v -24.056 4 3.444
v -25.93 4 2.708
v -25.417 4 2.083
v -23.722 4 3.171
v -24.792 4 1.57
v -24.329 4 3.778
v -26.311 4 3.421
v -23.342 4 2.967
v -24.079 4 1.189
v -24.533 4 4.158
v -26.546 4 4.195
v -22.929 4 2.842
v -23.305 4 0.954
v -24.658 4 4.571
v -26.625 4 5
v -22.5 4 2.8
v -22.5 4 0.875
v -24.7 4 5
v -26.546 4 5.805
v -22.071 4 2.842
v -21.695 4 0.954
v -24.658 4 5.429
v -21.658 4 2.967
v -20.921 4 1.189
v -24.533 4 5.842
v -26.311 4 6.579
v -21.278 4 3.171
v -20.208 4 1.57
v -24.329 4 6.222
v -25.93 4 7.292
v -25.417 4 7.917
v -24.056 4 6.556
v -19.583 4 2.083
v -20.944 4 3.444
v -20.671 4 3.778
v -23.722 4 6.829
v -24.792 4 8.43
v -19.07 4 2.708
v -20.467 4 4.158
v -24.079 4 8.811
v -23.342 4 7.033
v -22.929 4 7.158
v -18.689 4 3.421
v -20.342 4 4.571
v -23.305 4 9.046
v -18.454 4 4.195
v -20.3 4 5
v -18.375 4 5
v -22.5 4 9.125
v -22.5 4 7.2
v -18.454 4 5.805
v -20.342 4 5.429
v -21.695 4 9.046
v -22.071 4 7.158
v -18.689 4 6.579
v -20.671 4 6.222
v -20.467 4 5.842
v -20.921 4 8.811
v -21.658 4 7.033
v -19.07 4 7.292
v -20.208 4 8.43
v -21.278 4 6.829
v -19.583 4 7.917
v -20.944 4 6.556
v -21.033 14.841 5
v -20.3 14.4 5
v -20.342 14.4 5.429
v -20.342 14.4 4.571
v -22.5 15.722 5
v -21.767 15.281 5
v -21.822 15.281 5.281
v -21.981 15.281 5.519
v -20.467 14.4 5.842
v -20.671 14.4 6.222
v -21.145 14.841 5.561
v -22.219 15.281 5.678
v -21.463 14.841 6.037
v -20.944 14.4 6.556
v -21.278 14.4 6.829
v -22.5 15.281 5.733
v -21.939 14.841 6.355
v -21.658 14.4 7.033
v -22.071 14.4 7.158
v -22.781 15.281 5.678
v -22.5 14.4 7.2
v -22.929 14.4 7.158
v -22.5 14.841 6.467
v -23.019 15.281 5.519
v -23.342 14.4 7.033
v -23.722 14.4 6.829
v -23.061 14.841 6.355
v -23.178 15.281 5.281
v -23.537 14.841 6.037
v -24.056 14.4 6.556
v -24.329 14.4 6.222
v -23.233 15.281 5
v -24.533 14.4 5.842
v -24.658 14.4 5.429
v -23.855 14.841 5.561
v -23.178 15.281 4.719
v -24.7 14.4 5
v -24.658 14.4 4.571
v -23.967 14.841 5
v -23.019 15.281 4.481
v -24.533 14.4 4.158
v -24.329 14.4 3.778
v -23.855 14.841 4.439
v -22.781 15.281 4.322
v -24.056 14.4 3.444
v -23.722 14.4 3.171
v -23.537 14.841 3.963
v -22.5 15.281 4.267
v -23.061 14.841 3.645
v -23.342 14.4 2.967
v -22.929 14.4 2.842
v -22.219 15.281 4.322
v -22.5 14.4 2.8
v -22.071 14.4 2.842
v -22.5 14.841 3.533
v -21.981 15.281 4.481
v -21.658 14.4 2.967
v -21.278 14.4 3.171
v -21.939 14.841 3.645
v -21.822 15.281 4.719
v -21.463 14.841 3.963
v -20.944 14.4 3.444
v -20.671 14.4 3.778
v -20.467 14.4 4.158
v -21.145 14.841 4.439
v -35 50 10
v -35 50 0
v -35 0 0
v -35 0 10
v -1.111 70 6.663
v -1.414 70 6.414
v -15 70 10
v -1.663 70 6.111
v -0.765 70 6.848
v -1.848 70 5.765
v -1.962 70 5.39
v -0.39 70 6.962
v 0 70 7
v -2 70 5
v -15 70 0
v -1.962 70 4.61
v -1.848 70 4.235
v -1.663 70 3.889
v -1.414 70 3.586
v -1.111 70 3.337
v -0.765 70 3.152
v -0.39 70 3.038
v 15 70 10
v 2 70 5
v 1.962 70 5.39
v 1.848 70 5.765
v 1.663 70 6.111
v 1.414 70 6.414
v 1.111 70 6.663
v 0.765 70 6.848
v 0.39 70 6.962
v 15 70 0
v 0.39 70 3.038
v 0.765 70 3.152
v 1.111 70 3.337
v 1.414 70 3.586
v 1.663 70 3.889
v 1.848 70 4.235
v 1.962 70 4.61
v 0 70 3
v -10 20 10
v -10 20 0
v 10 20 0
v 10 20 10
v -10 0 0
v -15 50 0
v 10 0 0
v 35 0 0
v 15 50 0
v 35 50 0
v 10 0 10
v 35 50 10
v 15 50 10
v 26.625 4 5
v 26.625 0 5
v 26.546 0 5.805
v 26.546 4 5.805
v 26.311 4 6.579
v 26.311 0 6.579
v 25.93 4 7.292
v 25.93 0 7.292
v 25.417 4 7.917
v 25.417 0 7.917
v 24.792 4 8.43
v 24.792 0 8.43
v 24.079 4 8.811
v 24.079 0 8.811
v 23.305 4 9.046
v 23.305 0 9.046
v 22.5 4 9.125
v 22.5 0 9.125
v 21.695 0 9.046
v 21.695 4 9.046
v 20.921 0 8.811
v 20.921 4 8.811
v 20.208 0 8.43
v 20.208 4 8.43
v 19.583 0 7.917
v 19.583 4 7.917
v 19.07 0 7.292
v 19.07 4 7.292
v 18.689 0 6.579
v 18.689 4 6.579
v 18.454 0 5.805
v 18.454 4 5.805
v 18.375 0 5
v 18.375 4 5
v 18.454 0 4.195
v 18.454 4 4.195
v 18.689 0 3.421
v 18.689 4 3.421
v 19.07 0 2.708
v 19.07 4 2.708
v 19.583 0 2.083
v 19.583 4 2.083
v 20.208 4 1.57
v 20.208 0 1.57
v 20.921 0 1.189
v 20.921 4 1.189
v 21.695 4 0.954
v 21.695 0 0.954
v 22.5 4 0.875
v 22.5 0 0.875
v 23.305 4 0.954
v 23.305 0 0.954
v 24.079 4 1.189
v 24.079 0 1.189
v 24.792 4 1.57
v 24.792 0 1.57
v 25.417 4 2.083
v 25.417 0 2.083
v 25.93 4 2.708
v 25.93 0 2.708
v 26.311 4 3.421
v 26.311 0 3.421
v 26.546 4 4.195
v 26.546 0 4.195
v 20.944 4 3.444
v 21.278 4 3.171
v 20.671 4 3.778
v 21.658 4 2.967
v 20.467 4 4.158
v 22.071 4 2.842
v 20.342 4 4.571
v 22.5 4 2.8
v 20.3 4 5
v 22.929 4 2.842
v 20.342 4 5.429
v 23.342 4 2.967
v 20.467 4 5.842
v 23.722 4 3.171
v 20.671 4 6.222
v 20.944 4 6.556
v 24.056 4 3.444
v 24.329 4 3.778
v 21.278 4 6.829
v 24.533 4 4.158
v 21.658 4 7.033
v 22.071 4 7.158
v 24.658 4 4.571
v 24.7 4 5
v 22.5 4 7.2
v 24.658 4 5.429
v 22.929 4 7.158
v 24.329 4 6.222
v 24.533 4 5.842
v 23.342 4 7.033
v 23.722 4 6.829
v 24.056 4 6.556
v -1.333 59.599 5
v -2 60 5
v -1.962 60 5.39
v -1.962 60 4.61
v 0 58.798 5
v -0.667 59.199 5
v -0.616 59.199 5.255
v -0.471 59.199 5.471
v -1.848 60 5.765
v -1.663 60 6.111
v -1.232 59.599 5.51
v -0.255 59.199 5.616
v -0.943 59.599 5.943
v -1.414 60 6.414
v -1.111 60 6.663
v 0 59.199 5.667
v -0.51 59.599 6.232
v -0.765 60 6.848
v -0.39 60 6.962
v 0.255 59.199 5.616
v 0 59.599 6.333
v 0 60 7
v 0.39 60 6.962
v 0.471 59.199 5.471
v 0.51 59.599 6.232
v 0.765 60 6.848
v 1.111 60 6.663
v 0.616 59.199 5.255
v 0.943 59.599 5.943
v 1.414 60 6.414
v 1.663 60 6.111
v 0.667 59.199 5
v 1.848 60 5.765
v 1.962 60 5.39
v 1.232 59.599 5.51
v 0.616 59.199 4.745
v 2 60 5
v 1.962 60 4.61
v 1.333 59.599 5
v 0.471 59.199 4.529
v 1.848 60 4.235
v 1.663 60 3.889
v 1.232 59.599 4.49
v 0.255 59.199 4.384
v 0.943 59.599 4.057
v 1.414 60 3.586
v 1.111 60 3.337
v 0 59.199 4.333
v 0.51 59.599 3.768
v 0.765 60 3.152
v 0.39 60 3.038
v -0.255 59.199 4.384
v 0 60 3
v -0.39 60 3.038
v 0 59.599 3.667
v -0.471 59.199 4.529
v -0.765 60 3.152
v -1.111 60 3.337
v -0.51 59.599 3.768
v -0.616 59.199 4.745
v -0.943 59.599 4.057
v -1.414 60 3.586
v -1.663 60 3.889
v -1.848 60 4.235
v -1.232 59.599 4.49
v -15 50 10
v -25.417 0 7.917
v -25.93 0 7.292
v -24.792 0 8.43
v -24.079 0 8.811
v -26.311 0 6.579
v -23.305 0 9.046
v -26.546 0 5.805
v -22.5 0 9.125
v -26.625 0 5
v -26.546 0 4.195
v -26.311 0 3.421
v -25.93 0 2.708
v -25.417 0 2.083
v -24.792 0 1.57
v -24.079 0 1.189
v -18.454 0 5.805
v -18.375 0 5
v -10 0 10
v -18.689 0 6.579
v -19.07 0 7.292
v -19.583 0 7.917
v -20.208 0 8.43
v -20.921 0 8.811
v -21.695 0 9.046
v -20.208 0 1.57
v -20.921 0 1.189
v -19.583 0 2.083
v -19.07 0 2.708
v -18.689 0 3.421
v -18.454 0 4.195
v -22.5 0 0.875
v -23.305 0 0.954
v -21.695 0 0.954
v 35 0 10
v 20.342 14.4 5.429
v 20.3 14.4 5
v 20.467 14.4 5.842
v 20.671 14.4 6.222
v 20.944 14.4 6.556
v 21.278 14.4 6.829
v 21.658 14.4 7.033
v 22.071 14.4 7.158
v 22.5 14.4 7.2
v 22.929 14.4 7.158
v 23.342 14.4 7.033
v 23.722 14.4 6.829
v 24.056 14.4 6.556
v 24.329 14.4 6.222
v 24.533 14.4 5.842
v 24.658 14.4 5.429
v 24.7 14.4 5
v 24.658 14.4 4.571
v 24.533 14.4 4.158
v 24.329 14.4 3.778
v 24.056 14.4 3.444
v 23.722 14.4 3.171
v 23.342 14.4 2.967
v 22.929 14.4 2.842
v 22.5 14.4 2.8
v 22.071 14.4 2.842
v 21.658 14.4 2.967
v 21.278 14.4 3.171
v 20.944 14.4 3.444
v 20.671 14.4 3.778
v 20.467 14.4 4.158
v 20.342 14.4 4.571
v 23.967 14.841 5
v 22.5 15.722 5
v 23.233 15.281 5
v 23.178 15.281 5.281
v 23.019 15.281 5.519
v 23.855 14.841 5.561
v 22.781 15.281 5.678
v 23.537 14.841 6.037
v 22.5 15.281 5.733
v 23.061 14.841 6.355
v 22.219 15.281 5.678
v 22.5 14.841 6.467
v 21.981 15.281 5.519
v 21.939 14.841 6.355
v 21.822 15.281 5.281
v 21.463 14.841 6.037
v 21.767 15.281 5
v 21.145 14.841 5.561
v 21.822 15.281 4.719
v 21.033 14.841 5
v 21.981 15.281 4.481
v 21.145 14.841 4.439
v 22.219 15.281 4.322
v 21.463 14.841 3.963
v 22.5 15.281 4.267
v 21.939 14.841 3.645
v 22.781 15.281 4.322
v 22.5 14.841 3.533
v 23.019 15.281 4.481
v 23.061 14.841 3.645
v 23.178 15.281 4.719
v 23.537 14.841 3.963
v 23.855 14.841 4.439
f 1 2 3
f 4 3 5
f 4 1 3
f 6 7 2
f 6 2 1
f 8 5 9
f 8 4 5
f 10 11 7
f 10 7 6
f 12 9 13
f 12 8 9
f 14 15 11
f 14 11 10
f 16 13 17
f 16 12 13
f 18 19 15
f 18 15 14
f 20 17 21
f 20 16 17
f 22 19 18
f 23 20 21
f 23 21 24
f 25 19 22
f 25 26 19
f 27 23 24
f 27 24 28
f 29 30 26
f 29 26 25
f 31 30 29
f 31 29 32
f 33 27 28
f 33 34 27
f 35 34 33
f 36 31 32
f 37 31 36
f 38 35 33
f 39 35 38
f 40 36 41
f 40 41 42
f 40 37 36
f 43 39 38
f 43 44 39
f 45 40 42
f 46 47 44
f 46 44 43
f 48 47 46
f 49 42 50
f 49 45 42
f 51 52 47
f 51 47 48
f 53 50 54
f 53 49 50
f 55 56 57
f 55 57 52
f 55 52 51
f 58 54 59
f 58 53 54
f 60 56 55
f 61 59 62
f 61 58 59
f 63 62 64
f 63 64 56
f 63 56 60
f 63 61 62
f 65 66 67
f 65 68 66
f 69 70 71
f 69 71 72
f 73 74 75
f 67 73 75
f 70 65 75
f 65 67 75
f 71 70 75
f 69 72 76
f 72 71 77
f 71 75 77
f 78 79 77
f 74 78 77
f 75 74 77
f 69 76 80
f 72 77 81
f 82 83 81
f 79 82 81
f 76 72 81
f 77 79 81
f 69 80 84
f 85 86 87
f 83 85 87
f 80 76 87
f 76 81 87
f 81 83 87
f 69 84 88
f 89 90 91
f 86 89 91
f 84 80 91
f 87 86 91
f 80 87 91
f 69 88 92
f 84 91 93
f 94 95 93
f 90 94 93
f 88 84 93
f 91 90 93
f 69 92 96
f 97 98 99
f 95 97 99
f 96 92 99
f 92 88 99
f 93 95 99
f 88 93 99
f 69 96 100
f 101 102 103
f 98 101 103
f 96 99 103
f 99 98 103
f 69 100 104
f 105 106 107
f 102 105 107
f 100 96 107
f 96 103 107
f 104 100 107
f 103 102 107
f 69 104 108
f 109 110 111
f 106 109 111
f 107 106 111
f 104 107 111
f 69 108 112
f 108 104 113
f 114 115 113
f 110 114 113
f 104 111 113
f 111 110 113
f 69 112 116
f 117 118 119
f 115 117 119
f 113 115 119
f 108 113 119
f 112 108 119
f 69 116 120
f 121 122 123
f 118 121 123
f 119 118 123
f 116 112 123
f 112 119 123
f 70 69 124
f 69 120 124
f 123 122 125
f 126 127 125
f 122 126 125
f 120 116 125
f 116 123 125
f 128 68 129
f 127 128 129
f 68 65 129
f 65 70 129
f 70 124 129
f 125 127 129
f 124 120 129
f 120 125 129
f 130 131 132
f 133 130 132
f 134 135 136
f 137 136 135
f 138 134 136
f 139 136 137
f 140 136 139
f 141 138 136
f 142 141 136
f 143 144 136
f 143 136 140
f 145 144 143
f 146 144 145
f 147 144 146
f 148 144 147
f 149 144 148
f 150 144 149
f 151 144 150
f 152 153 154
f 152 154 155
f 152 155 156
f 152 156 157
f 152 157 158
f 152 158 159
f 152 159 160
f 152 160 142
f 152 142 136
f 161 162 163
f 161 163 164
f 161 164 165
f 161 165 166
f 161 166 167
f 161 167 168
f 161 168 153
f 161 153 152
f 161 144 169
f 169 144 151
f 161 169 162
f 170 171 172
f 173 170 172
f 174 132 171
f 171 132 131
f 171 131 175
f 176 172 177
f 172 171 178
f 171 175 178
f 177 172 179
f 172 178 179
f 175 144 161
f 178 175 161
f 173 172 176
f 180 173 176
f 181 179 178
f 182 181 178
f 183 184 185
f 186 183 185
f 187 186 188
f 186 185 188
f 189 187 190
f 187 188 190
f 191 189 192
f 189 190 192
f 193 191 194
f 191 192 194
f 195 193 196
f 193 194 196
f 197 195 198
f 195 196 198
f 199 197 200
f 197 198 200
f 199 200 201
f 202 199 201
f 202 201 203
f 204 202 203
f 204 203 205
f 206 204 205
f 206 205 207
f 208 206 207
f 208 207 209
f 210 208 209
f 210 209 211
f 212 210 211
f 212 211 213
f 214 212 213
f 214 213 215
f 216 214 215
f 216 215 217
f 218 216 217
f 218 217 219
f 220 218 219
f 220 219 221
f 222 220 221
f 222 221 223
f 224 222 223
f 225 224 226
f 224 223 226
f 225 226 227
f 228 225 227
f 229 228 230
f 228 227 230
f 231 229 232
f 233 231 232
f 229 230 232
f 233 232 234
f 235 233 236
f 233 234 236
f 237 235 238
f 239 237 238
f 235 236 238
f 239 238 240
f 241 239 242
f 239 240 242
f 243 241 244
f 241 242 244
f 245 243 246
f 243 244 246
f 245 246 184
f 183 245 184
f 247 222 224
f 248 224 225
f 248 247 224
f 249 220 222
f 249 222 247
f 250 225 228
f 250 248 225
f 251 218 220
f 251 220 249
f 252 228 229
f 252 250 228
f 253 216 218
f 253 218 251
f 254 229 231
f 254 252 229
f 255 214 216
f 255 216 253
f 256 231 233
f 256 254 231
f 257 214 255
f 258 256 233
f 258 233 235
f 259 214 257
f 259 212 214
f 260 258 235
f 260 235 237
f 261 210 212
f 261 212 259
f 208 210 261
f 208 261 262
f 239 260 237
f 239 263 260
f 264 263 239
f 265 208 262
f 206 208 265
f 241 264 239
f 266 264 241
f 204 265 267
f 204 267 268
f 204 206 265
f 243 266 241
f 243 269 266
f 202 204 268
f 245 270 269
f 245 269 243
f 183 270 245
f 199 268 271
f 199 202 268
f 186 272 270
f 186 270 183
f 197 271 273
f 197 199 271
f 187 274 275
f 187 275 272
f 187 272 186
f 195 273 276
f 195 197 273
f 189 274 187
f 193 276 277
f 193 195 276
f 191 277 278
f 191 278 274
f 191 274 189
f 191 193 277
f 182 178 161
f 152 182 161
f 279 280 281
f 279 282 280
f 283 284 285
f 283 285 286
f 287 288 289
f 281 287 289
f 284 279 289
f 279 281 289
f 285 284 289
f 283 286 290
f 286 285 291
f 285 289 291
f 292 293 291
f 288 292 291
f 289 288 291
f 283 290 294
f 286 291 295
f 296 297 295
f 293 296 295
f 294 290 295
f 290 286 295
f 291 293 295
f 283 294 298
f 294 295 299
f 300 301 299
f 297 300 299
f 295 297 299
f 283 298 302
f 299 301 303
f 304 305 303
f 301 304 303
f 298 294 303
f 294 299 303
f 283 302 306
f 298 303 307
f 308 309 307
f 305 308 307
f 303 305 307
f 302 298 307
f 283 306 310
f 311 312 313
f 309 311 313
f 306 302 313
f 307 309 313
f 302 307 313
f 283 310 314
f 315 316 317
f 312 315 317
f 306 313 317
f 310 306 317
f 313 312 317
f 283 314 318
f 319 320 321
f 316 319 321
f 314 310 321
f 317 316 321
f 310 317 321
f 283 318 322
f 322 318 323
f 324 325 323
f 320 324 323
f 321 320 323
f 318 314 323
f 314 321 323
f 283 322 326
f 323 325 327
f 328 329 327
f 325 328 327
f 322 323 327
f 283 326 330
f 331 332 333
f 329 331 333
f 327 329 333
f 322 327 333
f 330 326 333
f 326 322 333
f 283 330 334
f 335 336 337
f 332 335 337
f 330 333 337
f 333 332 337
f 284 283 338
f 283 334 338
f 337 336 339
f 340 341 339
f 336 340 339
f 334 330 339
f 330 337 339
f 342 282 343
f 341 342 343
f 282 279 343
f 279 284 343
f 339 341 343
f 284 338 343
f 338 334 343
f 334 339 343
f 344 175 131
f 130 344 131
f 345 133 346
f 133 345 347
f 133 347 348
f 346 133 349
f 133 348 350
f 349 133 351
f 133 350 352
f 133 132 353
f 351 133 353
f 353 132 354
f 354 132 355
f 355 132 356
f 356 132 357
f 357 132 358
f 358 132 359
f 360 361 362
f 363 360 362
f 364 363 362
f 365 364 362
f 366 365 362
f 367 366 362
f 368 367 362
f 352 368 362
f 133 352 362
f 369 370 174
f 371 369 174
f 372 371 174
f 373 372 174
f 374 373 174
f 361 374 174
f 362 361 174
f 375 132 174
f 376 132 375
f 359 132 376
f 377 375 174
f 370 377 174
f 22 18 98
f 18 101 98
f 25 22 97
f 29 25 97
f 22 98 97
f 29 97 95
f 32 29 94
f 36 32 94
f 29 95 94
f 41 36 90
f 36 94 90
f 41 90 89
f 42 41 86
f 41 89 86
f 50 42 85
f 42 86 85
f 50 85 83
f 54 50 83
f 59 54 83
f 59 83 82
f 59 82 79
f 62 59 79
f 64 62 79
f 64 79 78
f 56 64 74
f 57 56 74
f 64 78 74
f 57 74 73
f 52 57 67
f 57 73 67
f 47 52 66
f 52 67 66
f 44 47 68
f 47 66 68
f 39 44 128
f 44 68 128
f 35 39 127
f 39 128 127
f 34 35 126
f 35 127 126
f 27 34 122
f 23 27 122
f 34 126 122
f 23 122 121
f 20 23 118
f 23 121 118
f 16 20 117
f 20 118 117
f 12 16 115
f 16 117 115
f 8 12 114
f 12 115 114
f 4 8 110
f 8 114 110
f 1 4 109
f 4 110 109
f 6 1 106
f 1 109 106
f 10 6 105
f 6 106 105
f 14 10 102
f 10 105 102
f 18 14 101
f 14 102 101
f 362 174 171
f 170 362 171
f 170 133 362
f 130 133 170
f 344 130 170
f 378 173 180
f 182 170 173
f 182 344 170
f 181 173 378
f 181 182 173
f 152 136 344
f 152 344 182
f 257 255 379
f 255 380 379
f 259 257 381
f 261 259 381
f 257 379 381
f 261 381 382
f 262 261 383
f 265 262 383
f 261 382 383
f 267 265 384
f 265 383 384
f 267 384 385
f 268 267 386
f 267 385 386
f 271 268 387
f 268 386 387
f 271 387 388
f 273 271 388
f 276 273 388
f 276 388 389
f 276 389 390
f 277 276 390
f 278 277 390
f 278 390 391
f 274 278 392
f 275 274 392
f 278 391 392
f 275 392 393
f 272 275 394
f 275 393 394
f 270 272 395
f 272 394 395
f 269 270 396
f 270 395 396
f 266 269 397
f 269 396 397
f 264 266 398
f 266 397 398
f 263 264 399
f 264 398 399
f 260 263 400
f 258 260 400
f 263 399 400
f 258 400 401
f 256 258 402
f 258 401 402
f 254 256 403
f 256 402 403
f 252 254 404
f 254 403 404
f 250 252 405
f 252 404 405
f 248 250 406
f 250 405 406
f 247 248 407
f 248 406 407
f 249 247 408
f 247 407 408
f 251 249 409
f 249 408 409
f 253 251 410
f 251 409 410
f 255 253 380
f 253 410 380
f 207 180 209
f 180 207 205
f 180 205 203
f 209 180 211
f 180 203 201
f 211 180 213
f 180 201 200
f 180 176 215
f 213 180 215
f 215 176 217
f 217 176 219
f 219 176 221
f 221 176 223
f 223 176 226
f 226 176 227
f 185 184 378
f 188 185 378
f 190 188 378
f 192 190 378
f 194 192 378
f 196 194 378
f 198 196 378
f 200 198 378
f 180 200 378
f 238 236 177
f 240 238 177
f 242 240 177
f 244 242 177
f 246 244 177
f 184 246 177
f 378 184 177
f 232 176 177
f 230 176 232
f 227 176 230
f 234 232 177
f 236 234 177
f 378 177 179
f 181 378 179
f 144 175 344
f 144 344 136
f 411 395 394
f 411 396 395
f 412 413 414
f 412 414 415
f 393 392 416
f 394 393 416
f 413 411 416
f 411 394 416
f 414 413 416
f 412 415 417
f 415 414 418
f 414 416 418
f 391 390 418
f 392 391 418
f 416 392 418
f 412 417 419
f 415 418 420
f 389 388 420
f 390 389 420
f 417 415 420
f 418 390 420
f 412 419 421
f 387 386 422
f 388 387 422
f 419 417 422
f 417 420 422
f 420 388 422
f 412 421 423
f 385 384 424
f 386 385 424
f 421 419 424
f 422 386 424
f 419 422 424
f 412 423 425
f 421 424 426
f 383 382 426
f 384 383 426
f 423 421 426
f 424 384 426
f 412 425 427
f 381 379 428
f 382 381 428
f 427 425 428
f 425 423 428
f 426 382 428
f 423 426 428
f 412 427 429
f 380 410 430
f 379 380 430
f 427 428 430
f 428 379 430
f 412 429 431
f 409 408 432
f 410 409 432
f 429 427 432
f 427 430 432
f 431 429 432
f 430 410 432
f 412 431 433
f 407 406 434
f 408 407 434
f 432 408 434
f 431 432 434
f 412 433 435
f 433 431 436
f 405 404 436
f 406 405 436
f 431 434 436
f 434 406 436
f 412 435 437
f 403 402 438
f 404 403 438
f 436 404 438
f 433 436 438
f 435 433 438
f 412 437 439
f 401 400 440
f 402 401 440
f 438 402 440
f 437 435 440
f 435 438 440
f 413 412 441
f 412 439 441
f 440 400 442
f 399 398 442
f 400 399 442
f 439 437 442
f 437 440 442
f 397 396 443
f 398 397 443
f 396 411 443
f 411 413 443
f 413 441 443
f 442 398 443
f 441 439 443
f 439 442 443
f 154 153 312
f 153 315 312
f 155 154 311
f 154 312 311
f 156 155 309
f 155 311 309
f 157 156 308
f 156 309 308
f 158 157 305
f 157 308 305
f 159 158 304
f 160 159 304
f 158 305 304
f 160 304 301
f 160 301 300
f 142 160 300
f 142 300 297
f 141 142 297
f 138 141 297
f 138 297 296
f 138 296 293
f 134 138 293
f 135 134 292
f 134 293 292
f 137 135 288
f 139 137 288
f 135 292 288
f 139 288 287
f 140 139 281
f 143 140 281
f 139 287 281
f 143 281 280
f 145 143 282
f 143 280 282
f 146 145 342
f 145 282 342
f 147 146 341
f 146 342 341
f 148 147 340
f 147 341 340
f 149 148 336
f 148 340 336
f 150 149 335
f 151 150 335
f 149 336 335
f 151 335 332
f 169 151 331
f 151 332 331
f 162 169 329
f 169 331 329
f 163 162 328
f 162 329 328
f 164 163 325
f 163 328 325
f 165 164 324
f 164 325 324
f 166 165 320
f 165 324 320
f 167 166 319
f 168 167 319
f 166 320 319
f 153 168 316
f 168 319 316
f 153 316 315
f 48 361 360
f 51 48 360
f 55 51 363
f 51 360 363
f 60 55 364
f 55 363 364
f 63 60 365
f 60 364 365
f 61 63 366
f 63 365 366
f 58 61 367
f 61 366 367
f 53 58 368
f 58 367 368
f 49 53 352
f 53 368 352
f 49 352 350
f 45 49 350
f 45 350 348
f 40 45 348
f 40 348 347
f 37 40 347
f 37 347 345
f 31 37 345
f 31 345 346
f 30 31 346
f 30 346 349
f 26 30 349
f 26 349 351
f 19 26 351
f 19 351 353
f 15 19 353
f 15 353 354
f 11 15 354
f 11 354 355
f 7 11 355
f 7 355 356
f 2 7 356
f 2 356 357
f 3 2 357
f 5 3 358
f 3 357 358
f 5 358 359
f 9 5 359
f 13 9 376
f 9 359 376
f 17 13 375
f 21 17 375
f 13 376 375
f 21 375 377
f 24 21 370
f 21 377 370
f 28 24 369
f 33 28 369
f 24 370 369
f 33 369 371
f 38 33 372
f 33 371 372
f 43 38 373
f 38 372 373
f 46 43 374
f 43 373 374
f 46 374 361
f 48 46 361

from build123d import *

# Parameters (mm, degrees)
F0_W                 = 30
F0_H                 = 20
F1_DEPTH             = 10
F4_D                 = 4.4
F4_DEPTH             = 14.4
F4_CBORE_D           = 8.25
F4_CBORE_DEPTH       = 4
F4_TIP               = 1.3218933619
F4_ON_F3_D           = 4.4
F4_ON_F3_DEPTH       = 14.4
F4_ON_F3_CBORE_D     = 8.25
F4_ON_F3_CBORE_DEPTH = 4
F4_ON_F3_TIP         = 1.3218933619
F6_D                 = 4
F6_DEPTH             = 10
F6_TIP               = 1.2017212381


with BuildPart() as f1:
    # F0 (on Top) → F1 (new body)
    with BuildSketch(Plane.XY):
        Polygon((-15, 50), (-35, 50), (-35, 0), (-10, 0), (-10, 20), (10, 20), (10, 0), (35, 0), (35, 50), (15, 50), align=None)
        with Locations((0, 60)):
            Rectangle(F0_W, F0_H)
    extrude(amount=F1_DEPTH)

    # F4
    with Locations(Plane.XZ):
        with Locations((-22.5, 5)):
            CounterBoreHole(F4_D / 2, F4_CBORE_D / 2, F4_CBORE_DEPTH, depth=F4_DEPTH)
            with Locations((0, 0, -(F4_DEPTH + F4_TIP / 2))):  # 118° drill point
                Cone(0, F4_D / 2, F4_TIP, mode=Mode.SUBTRACT)

    # F4 on F3
    with Locations(Plane.XZ):
        with Locations((22.5, 5)):
            CounterBoreHole(F4_ON_F3_D / 2, F4_ON_F3_CBORE_D / 2, F4_ON_F3_CBORE_DEPTH, depth=F4_ON_F3_DEPTH)
            with Locations((0, 0, -(F4_ON_F3_DEPTH + F4_ON_F3_TIP / 2))):  # 118° drill point
                Cone(0, F4_ON_F3_D / 2, F4_ON_F3_TIP, mode=Mode.SUBTRACT)

    # F6
    with Locations(Plane(origin=(0, 70, 0), x_dir=(-1, 0, 0), z_dir=(0, 1, 0))):
        with Locations((0, 5)):
            Hole(F6_D / 2, depth=F6_DEPTH)
            with Locations((0, 0, -(F6_DEPTH + F6_TIP / 2))):  # 118° drill point
                Cone(0, F6_D / 2, F6_TIP, mode=Mode.SUBTRACT)


solid = f1.part
